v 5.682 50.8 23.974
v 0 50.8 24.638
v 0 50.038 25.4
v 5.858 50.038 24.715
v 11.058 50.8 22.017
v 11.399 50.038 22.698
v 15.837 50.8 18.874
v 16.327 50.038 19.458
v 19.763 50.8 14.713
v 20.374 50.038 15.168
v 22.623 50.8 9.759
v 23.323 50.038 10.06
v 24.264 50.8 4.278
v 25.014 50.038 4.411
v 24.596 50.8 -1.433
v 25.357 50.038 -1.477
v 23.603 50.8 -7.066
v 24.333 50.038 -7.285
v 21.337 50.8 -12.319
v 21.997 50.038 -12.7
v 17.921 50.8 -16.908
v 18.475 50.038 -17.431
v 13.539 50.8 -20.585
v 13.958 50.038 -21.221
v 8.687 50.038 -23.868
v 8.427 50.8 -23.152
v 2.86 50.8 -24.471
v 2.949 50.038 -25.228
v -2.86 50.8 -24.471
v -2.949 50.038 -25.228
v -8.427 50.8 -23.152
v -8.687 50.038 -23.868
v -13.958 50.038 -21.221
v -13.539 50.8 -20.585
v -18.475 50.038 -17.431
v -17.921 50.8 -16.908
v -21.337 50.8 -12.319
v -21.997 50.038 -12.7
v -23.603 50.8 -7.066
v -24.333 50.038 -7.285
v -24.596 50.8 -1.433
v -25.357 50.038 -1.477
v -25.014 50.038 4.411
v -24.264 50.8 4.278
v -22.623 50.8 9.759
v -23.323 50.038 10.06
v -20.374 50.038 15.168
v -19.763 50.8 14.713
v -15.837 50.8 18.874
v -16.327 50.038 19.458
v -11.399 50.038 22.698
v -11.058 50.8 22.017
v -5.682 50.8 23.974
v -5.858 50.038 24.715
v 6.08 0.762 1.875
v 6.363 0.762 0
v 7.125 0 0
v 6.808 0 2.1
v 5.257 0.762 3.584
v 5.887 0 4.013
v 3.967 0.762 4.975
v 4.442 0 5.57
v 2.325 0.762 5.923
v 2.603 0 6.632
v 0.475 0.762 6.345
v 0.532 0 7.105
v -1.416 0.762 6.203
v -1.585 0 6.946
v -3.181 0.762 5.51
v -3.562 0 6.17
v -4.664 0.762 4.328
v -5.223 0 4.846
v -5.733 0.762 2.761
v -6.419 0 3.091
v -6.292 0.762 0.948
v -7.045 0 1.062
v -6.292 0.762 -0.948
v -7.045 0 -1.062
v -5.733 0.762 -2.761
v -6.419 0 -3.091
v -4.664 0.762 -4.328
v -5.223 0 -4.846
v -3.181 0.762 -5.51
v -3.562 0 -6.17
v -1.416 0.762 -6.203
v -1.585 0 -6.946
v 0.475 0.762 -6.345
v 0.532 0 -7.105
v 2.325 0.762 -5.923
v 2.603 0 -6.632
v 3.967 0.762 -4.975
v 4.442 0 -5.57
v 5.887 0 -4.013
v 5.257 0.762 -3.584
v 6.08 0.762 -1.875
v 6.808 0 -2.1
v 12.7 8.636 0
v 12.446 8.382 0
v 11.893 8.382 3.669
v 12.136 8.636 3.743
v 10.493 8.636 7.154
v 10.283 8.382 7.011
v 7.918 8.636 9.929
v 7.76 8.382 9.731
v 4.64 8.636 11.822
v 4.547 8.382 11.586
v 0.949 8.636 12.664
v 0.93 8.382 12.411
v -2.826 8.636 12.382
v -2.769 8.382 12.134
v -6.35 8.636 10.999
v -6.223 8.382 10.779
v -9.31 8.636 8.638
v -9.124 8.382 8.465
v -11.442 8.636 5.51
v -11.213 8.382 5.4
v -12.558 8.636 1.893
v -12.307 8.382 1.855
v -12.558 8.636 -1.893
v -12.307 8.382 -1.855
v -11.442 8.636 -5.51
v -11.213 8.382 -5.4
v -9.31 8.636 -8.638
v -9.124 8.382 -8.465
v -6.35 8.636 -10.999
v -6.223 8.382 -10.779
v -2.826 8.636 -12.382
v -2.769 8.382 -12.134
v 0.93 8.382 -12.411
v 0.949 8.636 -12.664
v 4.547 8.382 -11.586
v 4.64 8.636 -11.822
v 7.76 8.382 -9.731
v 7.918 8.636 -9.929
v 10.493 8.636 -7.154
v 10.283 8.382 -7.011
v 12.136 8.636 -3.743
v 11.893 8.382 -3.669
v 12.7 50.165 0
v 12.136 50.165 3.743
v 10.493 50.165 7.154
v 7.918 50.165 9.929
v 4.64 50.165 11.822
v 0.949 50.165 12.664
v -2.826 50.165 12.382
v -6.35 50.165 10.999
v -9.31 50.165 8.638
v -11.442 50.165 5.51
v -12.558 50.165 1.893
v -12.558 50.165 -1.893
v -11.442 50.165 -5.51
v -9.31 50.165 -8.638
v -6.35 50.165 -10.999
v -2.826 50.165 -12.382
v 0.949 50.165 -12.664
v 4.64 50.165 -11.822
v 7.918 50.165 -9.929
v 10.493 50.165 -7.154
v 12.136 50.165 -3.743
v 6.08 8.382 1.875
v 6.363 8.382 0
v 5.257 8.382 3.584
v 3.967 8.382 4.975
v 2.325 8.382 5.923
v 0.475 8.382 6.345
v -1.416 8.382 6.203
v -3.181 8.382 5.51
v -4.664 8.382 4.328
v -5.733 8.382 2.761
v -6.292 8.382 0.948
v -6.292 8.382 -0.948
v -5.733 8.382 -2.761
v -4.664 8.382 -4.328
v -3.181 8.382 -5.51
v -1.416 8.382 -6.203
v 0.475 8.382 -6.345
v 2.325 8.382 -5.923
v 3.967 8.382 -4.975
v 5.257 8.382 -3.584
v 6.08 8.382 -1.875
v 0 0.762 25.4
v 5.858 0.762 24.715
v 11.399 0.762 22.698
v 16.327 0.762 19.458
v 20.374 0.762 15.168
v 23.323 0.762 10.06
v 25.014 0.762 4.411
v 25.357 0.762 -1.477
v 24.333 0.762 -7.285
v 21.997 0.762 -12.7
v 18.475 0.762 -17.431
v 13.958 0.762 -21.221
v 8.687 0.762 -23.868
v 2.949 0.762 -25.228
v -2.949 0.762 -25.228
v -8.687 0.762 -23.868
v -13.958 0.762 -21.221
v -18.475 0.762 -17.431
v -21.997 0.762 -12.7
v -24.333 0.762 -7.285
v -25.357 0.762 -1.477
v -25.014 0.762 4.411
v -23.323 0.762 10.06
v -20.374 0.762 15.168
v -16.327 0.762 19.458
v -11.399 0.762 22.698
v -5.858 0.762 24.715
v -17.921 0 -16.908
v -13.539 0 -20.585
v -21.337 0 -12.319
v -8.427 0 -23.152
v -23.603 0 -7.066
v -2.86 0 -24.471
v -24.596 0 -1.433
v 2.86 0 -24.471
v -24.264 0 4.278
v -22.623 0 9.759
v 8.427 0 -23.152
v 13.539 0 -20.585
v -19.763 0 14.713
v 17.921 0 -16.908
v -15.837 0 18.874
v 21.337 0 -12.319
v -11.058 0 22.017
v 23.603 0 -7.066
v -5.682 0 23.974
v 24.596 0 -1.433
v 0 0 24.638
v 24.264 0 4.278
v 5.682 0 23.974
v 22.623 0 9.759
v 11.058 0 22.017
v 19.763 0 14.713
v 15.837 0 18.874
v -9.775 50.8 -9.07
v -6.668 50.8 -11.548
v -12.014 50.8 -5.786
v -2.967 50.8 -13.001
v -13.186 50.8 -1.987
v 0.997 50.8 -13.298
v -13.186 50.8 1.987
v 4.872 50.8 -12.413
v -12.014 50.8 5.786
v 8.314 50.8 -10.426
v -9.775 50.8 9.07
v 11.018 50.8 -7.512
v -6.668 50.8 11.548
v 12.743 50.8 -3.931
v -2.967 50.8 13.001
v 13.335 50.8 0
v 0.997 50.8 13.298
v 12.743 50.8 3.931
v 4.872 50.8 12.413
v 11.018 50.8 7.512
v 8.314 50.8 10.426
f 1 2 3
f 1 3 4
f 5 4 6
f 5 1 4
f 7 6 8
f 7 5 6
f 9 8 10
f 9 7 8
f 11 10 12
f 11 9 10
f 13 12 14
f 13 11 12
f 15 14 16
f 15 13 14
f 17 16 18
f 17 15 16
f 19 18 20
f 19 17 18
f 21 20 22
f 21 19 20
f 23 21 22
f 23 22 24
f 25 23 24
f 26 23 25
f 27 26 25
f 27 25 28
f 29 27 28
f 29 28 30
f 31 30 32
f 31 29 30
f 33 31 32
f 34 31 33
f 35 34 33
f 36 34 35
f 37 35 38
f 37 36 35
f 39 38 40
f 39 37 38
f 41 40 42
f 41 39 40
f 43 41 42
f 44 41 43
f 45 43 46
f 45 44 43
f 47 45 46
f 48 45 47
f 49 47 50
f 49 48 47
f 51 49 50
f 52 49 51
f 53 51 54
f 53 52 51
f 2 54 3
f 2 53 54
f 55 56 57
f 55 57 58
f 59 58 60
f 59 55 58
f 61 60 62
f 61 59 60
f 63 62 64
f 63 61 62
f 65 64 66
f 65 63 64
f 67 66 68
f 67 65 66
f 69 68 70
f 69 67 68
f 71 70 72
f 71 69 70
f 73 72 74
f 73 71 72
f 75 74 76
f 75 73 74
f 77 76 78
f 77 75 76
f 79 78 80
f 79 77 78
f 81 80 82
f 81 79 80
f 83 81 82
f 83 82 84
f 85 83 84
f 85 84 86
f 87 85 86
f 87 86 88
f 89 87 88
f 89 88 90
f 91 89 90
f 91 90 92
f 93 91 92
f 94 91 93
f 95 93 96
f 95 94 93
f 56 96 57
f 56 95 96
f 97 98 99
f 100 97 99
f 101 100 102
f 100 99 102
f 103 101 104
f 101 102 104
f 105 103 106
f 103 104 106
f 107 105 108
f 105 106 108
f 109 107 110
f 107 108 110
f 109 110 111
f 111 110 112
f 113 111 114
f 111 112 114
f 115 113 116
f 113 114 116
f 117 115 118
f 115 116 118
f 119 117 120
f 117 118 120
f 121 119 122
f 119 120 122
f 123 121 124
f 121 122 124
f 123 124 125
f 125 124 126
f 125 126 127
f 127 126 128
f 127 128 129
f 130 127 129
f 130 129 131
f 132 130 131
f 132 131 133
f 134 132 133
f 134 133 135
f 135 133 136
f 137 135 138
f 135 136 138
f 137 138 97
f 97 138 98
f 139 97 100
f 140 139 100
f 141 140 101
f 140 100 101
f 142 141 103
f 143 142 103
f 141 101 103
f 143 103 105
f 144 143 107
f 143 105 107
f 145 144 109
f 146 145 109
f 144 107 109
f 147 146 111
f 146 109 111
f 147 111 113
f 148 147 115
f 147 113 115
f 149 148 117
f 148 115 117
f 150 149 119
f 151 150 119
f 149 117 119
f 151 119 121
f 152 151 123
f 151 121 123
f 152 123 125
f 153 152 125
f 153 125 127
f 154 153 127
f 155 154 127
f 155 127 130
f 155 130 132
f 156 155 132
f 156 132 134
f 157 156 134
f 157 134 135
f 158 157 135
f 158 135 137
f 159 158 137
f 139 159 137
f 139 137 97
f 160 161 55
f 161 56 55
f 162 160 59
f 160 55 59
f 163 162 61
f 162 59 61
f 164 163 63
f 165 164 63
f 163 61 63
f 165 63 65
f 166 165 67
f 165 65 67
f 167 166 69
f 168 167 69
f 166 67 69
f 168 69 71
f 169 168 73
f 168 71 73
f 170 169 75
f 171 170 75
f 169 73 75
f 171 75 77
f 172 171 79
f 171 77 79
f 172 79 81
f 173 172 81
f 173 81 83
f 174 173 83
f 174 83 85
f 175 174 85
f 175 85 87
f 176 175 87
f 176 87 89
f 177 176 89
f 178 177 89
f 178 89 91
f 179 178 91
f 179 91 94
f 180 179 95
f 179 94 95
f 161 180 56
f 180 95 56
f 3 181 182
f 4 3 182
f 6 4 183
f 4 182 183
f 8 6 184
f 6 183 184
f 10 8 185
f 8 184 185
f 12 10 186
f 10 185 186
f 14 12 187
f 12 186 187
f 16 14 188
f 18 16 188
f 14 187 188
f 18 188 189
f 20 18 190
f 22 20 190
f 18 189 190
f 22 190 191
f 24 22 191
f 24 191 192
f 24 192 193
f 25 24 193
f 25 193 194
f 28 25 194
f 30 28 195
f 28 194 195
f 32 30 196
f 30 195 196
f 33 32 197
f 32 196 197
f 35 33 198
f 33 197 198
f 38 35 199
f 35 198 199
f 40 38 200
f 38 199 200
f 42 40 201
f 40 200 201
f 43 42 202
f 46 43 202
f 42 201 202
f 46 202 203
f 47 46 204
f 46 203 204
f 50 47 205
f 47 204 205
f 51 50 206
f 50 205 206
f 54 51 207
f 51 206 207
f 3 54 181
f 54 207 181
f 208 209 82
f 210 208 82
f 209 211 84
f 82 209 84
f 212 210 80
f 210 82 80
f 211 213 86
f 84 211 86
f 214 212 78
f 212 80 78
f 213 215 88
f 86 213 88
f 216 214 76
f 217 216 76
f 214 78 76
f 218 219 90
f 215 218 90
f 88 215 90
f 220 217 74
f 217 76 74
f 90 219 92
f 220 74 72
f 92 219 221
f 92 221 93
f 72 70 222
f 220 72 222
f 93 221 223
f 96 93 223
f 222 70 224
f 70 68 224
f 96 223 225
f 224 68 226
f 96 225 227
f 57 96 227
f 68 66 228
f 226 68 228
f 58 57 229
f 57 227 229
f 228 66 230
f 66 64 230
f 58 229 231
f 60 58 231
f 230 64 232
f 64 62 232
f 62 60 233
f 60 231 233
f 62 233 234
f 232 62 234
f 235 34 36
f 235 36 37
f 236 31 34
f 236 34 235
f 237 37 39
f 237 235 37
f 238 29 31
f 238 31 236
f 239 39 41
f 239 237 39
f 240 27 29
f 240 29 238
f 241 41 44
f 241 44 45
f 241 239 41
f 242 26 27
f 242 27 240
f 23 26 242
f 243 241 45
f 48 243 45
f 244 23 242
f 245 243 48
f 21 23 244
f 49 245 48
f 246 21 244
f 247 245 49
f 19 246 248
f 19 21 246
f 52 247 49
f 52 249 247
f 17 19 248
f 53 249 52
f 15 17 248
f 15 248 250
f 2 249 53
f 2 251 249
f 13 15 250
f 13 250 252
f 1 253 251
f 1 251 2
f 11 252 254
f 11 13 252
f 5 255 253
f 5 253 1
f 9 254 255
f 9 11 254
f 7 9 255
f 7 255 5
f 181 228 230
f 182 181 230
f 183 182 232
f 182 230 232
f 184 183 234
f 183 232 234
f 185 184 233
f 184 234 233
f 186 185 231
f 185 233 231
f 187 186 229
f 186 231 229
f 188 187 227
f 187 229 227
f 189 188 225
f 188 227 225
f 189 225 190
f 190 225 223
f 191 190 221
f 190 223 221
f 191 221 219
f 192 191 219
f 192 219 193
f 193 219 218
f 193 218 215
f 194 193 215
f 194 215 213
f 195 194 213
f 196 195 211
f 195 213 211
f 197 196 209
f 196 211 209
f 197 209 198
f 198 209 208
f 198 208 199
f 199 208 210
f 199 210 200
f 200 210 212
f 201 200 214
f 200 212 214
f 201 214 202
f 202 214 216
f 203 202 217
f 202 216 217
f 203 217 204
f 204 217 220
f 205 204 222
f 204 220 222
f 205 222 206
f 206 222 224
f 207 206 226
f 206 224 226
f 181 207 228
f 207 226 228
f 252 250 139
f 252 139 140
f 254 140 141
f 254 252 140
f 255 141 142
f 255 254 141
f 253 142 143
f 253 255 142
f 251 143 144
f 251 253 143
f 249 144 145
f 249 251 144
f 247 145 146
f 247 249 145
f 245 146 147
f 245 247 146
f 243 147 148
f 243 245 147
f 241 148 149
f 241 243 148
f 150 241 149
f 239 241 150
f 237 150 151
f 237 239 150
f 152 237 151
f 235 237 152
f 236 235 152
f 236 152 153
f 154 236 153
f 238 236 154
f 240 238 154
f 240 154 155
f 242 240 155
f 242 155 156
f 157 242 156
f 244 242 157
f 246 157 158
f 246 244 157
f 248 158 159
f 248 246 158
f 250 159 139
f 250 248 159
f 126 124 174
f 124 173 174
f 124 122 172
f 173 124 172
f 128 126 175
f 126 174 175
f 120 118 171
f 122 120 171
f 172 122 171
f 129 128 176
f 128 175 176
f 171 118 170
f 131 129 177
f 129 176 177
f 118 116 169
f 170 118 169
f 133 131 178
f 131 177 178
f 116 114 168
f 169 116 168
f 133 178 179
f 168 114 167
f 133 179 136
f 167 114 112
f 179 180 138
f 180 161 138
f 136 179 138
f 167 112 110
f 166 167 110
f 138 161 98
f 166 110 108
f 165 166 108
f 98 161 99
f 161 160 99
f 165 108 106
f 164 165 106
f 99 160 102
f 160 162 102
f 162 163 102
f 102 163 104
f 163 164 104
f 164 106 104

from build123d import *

# Parameters (mm, degrees)
SKETCH1_R                  = 25.4
EXTRUDE1_DEPTH             = 50.8
F_1_2_0_5_DIAMETER_HOLE1_D = 12.7254
CHAMFER1_SIZE              = 0.762
F_1_1_DIAMETER_HOLE1_D     = 25.4
F_1_1_DIAMETER_HOLE1_DEPTH = 42.418
CHAMFER2_SIZE              = 0.254
CHAMFER3_SIZE              = 0.635


with BuildPart() as part:
    # Sketch1 → Extrude1 (new body)
    with BuildSketch(Plane(origin=(0, 0, 0), x_dir=(1, 0, 0), z_dir=(0, 1, 0))):
        with Locations(Location((0, 0, 0), (0, 0, 270))):  # turned: the seam where the file's is
            Circle(SKETCH1_R)
    extrude(amount=EXTRUDE1_DEPTH)

    # 1/2 (0.5) Diameter Hole1 (through all)
    with Locations(Plane(origin=(0, 50.8, 0), x_dir=(-1, 0, 0), z_dir=(0, 1, 0))):
        with Locations((0, 0)):
            Hole(F_1_2_0_5_DIAMETER_HOLE1_D / 2)

    # Chamfer1
    chamfer1_edges = [part.edges().sort_by_distance(p)[0] for p in [
        (0, 0, -25.4),
        (0, 50.8, -25.4),
        (-6.3627, 0, 0),
    ]]
    chamfer(chamfer1_edges, length=CHAMFER1_SIZE)

    # 1 (1) Diameter Hole1
    with Locations(Plane(origin=(0, 50.8, 0), x_dir=(-1, 0, 0), z_dir=(0, 1, 0))):
        with Locations((0, 0)):
            Hole(F_1_1_DIAMETER_HOLE1_D / 2, depth=F_1_1_DIAMETER_HOLE1_DEPTH)

    # Chamfer2
    chamfer2_edges = [part.edges().sort_by_distance(p)[0] for p in [
        (-12.7, 8.382, 0),
    ]]
    chamfer(chamfer2_edges, length=CHAMFER2_SIZE)

    # Chamfer3
    chamfer3_edges = [part.edges().sort_by_distance(p)[0] for p in [
        (-12.7, 50.8, 0),
    ]]
    chamfer(chamfer3_edges, length=CHAMFER3_SIZE)


solid = part.part
